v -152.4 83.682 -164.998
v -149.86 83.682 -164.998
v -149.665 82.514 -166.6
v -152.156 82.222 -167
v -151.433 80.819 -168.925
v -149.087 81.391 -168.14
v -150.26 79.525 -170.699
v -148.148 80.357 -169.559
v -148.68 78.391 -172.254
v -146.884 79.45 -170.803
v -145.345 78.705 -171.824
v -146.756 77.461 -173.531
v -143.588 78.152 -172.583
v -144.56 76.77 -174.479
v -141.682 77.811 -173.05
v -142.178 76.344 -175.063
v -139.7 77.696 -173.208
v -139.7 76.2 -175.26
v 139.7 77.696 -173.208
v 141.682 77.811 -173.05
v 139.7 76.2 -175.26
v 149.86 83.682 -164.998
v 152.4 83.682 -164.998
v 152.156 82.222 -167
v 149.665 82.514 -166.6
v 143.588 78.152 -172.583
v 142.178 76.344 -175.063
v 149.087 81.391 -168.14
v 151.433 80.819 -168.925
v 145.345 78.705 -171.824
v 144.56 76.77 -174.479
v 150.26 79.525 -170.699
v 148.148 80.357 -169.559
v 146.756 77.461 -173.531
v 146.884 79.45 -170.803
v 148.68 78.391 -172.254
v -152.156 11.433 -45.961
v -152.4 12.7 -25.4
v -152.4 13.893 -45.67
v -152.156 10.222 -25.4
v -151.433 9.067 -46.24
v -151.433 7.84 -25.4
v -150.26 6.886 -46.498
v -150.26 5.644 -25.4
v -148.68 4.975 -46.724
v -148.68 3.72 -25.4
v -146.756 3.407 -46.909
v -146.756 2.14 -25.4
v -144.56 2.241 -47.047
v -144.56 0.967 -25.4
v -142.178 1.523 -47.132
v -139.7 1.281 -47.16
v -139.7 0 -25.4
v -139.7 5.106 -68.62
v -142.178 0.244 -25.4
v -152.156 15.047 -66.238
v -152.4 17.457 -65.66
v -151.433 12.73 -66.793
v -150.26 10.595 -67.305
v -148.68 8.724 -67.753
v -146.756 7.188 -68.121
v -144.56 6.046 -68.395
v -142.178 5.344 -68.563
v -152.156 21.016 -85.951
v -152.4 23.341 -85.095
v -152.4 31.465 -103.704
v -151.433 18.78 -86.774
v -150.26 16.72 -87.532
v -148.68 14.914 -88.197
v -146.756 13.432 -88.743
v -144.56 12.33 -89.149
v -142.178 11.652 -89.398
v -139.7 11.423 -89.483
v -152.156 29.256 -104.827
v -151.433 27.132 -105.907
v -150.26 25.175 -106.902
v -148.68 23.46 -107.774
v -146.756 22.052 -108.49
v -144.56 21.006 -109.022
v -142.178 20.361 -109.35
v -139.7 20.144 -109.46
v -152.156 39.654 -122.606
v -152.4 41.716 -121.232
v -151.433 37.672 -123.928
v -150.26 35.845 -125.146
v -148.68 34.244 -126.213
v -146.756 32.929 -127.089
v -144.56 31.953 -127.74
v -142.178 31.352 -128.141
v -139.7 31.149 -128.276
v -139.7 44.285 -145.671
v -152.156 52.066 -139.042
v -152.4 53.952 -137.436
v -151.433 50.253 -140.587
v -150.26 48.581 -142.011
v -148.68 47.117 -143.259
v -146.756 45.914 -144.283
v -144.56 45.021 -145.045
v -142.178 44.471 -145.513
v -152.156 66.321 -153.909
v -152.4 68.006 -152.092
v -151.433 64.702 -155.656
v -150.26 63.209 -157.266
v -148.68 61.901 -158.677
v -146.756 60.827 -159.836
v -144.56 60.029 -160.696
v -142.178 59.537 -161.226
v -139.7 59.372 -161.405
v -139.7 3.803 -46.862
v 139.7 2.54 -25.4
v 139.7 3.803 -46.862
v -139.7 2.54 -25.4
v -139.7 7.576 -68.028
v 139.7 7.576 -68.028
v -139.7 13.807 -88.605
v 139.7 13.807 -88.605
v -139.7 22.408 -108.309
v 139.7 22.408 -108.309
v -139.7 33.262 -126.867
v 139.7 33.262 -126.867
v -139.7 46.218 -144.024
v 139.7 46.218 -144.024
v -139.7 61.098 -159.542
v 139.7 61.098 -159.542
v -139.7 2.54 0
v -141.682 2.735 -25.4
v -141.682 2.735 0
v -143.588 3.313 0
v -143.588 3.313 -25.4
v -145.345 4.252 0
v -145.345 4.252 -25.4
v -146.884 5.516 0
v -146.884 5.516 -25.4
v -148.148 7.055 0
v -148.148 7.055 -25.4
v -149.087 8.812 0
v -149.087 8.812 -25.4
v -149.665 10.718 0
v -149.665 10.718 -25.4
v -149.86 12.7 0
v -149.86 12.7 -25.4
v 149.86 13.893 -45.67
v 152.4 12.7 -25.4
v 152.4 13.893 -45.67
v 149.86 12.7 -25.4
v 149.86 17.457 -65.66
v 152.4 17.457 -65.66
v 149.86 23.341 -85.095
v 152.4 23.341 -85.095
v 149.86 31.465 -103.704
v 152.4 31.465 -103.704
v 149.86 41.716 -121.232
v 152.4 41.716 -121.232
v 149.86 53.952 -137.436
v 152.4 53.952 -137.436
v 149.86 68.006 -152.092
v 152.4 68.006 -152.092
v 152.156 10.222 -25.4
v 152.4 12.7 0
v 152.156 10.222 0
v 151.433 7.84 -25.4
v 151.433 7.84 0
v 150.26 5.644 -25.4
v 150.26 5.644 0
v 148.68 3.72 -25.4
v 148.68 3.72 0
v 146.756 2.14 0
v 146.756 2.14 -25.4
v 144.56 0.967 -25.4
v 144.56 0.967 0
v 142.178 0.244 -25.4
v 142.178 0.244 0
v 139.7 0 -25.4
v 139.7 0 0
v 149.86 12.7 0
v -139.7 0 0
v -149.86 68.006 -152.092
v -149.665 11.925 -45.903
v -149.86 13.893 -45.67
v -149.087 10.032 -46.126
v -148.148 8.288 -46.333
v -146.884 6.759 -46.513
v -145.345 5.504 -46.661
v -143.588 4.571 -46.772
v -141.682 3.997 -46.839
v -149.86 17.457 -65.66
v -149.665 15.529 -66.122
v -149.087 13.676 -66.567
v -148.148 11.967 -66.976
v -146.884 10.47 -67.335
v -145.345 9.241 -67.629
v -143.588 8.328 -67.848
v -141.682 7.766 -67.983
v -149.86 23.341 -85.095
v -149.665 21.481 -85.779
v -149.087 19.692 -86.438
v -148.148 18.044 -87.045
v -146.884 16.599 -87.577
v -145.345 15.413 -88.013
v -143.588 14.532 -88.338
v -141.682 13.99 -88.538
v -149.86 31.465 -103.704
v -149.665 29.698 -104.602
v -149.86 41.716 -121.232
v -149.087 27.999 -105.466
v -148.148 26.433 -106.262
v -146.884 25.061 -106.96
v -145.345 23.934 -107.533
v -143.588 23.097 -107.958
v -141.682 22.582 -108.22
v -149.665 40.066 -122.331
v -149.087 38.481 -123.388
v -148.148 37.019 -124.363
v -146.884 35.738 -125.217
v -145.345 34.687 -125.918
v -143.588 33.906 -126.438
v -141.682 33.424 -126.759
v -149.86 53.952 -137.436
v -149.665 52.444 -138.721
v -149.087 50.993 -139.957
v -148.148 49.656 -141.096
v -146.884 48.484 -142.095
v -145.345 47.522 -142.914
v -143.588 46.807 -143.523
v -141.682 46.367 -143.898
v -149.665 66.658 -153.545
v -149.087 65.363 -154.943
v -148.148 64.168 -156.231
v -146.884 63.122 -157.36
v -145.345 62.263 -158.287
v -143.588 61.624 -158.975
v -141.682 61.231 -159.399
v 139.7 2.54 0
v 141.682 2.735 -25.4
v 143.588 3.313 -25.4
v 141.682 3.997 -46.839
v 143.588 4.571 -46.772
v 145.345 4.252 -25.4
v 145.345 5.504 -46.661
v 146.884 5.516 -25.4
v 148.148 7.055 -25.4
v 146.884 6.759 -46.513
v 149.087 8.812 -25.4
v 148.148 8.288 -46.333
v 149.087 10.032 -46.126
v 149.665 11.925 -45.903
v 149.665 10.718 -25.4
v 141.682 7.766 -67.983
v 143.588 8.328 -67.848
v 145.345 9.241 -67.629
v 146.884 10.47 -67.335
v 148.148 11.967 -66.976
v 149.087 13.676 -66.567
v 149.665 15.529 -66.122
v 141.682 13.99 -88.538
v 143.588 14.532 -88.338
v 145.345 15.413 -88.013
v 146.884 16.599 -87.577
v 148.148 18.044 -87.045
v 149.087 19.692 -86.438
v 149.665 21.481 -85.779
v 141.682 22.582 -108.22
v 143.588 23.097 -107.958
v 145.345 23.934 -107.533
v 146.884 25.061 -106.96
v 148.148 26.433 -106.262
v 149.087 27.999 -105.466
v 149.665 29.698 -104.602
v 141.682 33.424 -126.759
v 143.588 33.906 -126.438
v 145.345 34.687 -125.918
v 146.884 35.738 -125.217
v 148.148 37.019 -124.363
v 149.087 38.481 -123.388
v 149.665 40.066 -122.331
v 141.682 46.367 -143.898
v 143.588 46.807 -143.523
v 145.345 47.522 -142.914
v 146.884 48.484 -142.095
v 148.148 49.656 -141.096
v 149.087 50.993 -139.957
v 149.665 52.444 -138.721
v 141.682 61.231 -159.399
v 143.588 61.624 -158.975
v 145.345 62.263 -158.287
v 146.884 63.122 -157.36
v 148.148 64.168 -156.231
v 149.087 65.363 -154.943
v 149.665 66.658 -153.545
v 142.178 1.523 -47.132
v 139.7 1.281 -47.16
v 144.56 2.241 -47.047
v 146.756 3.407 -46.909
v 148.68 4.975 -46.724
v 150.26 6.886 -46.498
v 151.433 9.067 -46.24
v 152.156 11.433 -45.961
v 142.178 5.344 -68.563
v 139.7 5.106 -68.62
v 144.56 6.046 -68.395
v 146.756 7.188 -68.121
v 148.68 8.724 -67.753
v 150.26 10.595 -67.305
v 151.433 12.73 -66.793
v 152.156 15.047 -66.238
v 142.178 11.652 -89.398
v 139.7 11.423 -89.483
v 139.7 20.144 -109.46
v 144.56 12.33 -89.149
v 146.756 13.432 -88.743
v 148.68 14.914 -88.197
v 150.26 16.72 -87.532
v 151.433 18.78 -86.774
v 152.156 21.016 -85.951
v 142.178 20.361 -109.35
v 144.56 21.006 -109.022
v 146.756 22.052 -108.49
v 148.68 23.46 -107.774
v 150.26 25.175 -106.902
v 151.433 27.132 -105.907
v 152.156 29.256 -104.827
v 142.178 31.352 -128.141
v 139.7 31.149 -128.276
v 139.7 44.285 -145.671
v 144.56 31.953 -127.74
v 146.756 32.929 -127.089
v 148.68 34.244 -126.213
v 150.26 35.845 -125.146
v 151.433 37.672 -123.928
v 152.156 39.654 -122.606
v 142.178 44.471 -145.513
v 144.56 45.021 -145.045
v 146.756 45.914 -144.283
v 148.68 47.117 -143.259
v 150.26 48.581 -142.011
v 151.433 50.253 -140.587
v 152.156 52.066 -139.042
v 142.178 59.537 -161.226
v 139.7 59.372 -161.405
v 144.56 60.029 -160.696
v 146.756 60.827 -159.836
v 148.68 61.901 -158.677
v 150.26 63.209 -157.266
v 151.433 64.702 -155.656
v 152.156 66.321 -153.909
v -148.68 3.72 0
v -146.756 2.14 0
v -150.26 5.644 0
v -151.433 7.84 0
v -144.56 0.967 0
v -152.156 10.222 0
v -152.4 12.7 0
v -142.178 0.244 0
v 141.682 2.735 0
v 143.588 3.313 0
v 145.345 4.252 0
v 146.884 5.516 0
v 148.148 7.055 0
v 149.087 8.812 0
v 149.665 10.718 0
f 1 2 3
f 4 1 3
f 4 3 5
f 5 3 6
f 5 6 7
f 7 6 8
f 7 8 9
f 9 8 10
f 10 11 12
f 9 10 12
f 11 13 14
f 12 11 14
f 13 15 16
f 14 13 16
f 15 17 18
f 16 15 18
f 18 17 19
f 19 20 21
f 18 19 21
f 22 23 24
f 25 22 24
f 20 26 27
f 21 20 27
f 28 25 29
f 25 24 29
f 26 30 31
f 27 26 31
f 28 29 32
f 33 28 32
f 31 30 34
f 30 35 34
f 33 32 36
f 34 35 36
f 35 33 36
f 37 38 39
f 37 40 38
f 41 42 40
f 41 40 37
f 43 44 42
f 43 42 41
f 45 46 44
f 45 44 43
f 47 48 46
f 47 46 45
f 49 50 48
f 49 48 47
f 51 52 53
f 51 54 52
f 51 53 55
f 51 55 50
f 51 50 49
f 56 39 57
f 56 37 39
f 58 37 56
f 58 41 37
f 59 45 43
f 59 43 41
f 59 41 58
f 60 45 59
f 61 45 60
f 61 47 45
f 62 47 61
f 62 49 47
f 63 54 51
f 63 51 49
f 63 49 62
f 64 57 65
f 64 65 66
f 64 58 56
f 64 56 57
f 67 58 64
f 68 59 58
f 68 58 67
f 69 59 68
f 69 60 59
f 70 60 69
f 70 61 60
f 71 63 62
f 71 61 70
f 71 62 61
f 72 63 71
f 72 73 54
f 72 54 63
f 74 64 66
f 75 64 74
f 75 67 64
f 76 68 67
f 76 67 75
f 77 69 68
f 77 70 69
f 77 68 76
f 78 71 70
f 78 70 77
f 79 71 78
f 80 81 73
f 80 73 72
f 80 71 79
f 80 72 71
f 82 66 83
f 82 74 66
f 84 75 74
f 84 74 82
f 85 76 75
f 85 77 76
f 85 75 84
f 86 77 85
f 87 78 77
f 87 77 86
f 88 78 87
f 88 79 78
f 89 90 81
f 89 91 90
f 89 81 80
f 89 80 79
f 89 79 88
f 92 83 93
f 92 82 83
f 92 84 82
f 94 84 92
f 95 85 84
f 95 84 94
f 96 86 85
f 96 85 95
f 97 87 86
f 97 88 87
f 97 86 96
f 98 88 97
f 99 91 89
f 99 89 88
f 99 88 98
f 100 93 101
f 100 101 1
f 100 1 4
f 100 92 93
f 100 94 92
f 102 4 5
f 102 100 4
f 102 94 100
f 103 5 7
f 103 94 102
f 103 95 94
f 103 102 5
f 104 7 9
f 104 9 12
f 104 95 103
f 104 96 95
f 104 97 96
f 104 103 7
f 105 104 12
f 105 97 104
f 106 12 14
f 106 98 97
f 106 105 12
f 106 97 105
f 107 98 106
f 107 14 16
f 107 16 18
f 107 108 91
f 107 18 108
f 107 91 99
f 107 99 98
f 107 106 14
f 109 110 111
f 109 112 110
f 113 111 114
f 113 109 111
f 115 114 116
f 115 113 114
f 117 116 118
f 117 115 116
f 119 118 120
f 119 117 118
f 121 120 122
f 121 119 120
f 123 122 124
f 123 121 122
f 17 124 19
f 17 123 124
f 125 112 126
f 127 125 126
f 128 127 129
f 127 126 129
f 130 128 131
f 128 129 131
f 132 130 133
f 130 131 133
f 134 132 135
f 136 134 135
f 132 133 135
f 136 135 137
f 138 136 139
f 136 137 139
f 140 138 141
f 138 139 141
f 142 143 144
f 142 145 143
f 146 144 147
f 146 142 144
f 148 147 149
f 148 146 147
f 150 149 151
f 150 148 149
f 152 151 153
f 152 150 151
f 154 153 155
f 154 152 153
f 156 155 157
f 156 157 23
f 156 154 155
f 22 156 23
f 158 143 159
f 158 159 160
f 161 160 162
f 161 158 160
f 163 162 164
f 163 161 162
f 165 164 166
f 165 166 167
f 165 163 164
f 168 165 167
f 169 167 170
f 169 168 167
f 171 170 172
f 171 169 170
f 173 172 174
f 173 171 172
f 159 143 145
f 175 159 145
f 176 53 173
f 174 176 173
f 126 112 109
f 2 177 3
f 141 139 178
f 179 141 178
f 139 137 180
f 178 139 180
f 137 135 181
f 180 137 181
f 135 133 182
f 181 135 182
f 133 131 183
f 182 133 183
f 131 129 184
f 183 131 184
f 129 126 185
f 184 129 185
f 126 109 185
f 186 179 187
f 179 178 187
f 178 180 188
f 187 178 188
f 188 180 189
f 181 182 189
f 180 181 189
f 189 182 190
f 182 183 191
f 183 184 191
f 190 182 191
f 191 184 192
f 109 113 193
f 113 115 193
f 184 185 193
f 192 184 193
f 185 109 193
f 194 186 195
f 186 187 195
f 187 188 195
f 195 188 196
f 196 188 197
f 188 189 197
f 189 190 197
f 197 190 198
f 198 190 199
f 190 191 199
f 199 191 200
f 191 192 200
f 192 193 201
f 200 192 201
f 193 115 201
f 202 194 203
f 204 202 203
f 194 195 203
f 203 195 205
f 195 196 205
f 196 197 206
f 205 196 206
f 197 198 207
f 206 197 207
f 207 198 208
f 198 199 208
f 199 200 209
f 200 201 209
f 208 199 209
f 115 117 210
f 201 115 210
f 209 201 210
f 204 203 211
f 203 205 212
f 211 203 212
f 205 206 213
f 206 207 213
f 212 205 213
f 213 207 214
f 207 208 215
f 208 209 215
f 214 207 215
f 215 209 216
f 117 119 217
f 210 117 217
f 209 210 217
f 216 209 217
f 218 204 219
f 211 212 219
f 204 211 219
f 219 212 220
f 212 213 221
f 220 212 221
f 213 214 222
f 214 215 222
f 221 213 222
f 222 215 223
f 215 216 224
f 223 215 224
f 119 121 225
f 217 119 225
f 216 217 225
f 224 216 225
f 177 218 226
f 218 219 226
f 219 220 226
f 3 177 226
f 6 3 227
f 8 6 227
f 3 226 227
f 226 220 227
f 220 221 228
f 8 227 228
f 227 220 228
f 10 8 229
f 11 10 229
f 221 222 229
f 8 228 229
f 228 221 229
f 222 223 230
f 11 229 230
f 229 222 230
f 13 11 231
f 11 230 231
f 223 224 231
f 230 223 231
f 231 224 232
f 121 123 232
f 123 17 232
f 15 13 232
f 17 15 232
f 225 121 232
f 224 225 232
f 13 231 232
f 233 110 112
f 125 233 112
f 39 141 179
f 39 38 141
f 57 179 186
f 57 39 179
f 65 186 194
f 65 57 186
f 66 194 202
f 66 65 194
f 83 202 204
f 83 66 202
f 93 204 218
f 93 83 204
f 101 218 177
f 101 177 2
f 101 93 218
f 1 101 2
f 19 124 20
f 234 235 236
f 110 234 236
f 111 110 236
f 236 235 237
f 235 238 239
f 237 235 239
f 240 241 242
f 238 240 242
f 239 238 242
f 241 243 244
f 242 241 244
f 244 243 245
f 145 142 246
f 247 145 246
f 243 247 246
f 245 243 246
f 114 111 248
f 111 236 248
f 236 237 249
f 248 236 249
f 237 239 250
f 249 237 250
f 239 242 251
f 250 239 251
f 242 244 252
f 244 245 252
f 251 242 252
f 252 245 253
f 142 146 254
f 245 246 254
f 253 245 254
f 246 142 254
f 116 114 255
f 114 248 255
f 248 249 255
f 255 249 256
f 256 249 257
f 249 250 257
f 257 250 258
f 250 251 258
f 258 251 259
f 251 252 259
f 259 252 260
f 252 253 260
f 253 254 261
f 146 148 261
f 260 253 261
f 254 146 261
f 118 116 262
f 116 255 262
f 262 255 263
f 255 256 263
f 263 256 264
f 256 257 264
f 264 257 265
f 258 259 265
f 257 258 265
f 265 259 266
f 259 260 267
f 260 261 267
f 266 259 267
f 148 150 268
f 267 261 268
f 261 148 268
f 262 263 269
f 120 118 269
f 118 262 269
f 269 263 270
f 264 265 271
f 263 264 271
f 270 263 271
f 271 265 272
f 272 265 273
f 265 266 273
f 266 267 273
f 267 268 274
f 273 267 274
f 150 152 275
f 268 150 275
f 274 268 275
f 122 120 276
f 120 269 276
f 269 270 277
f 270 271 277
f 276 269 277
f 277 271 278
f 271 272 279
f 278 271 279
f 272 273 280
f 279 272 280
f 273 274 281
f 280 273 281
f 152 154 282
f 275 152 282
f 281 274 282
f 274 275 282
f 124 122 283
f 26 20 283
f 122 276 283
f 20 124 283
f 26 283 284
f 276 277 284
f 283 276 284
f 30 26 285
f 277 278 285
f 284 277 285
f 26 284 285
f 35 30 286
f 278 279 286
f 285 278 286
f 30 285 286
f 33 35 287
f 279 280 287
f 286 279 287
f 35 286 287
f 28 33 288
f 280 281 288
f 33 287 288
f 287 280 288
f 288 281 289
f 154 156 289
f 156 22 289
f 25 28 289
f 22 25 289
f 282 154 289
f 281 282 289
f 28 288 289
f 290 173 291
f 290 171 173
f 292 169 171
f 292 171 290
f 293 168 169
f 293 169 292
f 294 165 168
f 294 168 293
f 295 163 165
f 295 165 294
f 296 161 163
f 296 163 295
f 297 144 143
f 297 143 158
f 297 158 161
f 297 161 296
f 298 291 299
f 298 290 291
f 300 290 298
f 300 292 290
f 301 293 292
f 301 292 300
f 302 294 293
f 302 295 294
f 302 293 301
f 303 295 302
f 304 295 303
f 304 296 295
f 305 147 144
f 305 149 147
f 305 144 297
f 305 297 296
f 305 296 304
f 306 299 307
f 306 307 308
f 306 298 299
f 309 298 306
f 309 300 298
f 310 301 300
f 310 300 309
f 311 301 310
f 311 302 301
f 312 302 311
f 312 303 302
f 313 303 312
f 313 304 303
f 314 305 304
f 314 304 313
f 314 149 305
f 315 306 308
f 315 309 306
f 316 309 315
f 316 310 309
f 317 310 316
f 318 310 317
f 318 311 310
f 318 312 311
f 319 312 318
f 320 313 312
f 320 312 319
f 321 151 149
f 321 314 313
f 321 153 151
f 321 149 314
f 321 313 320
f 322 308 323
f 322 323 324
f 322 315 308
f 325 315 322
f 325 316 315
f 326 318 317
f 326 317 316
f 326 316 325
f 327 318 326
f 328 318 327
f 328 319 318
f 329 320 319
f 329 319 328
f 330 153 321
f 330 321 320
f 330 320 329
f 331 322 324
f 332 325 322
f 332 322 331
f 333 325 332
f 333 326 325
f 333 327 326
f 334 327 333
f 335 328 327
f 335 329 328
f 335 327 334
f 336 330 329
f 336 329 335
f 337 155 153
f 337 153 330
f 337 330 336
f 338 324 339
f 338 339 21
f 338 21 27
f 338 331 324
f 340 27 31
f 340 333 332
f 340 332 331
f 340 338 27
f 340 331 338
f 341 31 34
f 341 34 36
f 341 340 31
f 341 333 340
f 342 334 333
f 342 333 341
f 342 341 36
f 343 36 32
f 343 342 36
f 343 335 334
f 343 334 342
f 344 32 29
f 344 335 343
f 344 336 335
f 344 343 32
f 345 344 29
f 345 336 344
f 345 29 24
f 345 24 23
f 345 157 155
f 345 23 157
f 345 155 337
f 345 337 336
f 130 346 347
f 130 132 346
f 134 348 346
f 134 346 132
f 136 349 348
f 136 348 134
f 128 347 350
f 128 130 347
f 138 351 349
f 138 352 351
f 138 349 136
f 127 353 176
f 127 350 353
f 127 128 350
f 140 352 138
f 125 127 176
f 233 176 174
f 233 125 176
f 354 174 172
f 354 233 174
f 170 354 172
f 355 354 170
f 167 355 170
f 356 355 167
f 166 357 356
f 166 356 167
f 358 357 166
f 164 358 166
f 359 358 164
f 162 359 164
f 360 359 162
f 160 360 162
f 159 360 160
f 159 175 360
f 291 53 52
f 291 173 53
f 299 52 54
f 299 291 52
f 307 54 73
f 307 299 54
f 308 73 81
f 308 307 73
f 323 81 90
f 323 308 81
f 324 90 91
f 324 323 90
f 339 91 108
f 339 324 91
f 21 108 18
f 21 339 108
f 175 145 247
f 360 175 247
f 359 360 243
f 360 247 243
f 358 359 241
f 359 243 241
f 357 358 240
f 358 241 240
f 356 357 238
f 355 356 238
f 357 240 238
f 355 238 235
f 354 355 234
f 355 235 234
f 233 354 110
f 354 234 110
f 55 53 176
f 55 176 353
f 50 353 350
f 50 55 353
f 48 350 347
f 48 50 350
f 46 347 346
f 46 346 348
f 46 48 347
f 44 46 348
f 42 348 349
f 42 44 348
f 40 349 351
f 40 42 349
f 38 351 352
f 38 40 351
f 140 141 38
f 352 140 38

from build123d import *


with BuildPart() as part:
    # Sweep1: sweep along a path in Sketch2
    with BuildLine(Plane(origin=(0, 0, 0), x_dir=(0, 0, -1), z_dir=(1, 0, 0))) as sweep1_path:
        Line((0, 0), (25.4, 0))
        ThreePointArc((25.4, 0), (109.460186176, 20.143967187), (175.26, 76.2))
    # Sketch1 → Sweep1 (sweep)
    with BuildSketch(Plane.XY):
        with BuildLine():
            Line((-139.7, 0), (139.7, 0))
            ThreePointArc((139.7, 0), (148.680256121, 3.719743879), (152.4, 12.7))
            Line((152.4, 12.7), (149.86, 12.7))
            ThreePointArc((149.86, 12.7), (146.884204897, 5.515795103), (139.7, 2.54))
            Line((139.7, 2.54), (-139.7, 2.54))
            ThreePointArc((-139.7, 2.54), (-146.884204897, 5.515795103), (-149.86, 12.7))
            Line((-149.86, 12.7), (-152.4, 12.7))
            ThreePointArc((-152.4, 12.7), (-148.680256121, 3.719743879), (-139.7, 0))
        make_face()
    sweep(path=sweep1_path.line)


solid = part.part
